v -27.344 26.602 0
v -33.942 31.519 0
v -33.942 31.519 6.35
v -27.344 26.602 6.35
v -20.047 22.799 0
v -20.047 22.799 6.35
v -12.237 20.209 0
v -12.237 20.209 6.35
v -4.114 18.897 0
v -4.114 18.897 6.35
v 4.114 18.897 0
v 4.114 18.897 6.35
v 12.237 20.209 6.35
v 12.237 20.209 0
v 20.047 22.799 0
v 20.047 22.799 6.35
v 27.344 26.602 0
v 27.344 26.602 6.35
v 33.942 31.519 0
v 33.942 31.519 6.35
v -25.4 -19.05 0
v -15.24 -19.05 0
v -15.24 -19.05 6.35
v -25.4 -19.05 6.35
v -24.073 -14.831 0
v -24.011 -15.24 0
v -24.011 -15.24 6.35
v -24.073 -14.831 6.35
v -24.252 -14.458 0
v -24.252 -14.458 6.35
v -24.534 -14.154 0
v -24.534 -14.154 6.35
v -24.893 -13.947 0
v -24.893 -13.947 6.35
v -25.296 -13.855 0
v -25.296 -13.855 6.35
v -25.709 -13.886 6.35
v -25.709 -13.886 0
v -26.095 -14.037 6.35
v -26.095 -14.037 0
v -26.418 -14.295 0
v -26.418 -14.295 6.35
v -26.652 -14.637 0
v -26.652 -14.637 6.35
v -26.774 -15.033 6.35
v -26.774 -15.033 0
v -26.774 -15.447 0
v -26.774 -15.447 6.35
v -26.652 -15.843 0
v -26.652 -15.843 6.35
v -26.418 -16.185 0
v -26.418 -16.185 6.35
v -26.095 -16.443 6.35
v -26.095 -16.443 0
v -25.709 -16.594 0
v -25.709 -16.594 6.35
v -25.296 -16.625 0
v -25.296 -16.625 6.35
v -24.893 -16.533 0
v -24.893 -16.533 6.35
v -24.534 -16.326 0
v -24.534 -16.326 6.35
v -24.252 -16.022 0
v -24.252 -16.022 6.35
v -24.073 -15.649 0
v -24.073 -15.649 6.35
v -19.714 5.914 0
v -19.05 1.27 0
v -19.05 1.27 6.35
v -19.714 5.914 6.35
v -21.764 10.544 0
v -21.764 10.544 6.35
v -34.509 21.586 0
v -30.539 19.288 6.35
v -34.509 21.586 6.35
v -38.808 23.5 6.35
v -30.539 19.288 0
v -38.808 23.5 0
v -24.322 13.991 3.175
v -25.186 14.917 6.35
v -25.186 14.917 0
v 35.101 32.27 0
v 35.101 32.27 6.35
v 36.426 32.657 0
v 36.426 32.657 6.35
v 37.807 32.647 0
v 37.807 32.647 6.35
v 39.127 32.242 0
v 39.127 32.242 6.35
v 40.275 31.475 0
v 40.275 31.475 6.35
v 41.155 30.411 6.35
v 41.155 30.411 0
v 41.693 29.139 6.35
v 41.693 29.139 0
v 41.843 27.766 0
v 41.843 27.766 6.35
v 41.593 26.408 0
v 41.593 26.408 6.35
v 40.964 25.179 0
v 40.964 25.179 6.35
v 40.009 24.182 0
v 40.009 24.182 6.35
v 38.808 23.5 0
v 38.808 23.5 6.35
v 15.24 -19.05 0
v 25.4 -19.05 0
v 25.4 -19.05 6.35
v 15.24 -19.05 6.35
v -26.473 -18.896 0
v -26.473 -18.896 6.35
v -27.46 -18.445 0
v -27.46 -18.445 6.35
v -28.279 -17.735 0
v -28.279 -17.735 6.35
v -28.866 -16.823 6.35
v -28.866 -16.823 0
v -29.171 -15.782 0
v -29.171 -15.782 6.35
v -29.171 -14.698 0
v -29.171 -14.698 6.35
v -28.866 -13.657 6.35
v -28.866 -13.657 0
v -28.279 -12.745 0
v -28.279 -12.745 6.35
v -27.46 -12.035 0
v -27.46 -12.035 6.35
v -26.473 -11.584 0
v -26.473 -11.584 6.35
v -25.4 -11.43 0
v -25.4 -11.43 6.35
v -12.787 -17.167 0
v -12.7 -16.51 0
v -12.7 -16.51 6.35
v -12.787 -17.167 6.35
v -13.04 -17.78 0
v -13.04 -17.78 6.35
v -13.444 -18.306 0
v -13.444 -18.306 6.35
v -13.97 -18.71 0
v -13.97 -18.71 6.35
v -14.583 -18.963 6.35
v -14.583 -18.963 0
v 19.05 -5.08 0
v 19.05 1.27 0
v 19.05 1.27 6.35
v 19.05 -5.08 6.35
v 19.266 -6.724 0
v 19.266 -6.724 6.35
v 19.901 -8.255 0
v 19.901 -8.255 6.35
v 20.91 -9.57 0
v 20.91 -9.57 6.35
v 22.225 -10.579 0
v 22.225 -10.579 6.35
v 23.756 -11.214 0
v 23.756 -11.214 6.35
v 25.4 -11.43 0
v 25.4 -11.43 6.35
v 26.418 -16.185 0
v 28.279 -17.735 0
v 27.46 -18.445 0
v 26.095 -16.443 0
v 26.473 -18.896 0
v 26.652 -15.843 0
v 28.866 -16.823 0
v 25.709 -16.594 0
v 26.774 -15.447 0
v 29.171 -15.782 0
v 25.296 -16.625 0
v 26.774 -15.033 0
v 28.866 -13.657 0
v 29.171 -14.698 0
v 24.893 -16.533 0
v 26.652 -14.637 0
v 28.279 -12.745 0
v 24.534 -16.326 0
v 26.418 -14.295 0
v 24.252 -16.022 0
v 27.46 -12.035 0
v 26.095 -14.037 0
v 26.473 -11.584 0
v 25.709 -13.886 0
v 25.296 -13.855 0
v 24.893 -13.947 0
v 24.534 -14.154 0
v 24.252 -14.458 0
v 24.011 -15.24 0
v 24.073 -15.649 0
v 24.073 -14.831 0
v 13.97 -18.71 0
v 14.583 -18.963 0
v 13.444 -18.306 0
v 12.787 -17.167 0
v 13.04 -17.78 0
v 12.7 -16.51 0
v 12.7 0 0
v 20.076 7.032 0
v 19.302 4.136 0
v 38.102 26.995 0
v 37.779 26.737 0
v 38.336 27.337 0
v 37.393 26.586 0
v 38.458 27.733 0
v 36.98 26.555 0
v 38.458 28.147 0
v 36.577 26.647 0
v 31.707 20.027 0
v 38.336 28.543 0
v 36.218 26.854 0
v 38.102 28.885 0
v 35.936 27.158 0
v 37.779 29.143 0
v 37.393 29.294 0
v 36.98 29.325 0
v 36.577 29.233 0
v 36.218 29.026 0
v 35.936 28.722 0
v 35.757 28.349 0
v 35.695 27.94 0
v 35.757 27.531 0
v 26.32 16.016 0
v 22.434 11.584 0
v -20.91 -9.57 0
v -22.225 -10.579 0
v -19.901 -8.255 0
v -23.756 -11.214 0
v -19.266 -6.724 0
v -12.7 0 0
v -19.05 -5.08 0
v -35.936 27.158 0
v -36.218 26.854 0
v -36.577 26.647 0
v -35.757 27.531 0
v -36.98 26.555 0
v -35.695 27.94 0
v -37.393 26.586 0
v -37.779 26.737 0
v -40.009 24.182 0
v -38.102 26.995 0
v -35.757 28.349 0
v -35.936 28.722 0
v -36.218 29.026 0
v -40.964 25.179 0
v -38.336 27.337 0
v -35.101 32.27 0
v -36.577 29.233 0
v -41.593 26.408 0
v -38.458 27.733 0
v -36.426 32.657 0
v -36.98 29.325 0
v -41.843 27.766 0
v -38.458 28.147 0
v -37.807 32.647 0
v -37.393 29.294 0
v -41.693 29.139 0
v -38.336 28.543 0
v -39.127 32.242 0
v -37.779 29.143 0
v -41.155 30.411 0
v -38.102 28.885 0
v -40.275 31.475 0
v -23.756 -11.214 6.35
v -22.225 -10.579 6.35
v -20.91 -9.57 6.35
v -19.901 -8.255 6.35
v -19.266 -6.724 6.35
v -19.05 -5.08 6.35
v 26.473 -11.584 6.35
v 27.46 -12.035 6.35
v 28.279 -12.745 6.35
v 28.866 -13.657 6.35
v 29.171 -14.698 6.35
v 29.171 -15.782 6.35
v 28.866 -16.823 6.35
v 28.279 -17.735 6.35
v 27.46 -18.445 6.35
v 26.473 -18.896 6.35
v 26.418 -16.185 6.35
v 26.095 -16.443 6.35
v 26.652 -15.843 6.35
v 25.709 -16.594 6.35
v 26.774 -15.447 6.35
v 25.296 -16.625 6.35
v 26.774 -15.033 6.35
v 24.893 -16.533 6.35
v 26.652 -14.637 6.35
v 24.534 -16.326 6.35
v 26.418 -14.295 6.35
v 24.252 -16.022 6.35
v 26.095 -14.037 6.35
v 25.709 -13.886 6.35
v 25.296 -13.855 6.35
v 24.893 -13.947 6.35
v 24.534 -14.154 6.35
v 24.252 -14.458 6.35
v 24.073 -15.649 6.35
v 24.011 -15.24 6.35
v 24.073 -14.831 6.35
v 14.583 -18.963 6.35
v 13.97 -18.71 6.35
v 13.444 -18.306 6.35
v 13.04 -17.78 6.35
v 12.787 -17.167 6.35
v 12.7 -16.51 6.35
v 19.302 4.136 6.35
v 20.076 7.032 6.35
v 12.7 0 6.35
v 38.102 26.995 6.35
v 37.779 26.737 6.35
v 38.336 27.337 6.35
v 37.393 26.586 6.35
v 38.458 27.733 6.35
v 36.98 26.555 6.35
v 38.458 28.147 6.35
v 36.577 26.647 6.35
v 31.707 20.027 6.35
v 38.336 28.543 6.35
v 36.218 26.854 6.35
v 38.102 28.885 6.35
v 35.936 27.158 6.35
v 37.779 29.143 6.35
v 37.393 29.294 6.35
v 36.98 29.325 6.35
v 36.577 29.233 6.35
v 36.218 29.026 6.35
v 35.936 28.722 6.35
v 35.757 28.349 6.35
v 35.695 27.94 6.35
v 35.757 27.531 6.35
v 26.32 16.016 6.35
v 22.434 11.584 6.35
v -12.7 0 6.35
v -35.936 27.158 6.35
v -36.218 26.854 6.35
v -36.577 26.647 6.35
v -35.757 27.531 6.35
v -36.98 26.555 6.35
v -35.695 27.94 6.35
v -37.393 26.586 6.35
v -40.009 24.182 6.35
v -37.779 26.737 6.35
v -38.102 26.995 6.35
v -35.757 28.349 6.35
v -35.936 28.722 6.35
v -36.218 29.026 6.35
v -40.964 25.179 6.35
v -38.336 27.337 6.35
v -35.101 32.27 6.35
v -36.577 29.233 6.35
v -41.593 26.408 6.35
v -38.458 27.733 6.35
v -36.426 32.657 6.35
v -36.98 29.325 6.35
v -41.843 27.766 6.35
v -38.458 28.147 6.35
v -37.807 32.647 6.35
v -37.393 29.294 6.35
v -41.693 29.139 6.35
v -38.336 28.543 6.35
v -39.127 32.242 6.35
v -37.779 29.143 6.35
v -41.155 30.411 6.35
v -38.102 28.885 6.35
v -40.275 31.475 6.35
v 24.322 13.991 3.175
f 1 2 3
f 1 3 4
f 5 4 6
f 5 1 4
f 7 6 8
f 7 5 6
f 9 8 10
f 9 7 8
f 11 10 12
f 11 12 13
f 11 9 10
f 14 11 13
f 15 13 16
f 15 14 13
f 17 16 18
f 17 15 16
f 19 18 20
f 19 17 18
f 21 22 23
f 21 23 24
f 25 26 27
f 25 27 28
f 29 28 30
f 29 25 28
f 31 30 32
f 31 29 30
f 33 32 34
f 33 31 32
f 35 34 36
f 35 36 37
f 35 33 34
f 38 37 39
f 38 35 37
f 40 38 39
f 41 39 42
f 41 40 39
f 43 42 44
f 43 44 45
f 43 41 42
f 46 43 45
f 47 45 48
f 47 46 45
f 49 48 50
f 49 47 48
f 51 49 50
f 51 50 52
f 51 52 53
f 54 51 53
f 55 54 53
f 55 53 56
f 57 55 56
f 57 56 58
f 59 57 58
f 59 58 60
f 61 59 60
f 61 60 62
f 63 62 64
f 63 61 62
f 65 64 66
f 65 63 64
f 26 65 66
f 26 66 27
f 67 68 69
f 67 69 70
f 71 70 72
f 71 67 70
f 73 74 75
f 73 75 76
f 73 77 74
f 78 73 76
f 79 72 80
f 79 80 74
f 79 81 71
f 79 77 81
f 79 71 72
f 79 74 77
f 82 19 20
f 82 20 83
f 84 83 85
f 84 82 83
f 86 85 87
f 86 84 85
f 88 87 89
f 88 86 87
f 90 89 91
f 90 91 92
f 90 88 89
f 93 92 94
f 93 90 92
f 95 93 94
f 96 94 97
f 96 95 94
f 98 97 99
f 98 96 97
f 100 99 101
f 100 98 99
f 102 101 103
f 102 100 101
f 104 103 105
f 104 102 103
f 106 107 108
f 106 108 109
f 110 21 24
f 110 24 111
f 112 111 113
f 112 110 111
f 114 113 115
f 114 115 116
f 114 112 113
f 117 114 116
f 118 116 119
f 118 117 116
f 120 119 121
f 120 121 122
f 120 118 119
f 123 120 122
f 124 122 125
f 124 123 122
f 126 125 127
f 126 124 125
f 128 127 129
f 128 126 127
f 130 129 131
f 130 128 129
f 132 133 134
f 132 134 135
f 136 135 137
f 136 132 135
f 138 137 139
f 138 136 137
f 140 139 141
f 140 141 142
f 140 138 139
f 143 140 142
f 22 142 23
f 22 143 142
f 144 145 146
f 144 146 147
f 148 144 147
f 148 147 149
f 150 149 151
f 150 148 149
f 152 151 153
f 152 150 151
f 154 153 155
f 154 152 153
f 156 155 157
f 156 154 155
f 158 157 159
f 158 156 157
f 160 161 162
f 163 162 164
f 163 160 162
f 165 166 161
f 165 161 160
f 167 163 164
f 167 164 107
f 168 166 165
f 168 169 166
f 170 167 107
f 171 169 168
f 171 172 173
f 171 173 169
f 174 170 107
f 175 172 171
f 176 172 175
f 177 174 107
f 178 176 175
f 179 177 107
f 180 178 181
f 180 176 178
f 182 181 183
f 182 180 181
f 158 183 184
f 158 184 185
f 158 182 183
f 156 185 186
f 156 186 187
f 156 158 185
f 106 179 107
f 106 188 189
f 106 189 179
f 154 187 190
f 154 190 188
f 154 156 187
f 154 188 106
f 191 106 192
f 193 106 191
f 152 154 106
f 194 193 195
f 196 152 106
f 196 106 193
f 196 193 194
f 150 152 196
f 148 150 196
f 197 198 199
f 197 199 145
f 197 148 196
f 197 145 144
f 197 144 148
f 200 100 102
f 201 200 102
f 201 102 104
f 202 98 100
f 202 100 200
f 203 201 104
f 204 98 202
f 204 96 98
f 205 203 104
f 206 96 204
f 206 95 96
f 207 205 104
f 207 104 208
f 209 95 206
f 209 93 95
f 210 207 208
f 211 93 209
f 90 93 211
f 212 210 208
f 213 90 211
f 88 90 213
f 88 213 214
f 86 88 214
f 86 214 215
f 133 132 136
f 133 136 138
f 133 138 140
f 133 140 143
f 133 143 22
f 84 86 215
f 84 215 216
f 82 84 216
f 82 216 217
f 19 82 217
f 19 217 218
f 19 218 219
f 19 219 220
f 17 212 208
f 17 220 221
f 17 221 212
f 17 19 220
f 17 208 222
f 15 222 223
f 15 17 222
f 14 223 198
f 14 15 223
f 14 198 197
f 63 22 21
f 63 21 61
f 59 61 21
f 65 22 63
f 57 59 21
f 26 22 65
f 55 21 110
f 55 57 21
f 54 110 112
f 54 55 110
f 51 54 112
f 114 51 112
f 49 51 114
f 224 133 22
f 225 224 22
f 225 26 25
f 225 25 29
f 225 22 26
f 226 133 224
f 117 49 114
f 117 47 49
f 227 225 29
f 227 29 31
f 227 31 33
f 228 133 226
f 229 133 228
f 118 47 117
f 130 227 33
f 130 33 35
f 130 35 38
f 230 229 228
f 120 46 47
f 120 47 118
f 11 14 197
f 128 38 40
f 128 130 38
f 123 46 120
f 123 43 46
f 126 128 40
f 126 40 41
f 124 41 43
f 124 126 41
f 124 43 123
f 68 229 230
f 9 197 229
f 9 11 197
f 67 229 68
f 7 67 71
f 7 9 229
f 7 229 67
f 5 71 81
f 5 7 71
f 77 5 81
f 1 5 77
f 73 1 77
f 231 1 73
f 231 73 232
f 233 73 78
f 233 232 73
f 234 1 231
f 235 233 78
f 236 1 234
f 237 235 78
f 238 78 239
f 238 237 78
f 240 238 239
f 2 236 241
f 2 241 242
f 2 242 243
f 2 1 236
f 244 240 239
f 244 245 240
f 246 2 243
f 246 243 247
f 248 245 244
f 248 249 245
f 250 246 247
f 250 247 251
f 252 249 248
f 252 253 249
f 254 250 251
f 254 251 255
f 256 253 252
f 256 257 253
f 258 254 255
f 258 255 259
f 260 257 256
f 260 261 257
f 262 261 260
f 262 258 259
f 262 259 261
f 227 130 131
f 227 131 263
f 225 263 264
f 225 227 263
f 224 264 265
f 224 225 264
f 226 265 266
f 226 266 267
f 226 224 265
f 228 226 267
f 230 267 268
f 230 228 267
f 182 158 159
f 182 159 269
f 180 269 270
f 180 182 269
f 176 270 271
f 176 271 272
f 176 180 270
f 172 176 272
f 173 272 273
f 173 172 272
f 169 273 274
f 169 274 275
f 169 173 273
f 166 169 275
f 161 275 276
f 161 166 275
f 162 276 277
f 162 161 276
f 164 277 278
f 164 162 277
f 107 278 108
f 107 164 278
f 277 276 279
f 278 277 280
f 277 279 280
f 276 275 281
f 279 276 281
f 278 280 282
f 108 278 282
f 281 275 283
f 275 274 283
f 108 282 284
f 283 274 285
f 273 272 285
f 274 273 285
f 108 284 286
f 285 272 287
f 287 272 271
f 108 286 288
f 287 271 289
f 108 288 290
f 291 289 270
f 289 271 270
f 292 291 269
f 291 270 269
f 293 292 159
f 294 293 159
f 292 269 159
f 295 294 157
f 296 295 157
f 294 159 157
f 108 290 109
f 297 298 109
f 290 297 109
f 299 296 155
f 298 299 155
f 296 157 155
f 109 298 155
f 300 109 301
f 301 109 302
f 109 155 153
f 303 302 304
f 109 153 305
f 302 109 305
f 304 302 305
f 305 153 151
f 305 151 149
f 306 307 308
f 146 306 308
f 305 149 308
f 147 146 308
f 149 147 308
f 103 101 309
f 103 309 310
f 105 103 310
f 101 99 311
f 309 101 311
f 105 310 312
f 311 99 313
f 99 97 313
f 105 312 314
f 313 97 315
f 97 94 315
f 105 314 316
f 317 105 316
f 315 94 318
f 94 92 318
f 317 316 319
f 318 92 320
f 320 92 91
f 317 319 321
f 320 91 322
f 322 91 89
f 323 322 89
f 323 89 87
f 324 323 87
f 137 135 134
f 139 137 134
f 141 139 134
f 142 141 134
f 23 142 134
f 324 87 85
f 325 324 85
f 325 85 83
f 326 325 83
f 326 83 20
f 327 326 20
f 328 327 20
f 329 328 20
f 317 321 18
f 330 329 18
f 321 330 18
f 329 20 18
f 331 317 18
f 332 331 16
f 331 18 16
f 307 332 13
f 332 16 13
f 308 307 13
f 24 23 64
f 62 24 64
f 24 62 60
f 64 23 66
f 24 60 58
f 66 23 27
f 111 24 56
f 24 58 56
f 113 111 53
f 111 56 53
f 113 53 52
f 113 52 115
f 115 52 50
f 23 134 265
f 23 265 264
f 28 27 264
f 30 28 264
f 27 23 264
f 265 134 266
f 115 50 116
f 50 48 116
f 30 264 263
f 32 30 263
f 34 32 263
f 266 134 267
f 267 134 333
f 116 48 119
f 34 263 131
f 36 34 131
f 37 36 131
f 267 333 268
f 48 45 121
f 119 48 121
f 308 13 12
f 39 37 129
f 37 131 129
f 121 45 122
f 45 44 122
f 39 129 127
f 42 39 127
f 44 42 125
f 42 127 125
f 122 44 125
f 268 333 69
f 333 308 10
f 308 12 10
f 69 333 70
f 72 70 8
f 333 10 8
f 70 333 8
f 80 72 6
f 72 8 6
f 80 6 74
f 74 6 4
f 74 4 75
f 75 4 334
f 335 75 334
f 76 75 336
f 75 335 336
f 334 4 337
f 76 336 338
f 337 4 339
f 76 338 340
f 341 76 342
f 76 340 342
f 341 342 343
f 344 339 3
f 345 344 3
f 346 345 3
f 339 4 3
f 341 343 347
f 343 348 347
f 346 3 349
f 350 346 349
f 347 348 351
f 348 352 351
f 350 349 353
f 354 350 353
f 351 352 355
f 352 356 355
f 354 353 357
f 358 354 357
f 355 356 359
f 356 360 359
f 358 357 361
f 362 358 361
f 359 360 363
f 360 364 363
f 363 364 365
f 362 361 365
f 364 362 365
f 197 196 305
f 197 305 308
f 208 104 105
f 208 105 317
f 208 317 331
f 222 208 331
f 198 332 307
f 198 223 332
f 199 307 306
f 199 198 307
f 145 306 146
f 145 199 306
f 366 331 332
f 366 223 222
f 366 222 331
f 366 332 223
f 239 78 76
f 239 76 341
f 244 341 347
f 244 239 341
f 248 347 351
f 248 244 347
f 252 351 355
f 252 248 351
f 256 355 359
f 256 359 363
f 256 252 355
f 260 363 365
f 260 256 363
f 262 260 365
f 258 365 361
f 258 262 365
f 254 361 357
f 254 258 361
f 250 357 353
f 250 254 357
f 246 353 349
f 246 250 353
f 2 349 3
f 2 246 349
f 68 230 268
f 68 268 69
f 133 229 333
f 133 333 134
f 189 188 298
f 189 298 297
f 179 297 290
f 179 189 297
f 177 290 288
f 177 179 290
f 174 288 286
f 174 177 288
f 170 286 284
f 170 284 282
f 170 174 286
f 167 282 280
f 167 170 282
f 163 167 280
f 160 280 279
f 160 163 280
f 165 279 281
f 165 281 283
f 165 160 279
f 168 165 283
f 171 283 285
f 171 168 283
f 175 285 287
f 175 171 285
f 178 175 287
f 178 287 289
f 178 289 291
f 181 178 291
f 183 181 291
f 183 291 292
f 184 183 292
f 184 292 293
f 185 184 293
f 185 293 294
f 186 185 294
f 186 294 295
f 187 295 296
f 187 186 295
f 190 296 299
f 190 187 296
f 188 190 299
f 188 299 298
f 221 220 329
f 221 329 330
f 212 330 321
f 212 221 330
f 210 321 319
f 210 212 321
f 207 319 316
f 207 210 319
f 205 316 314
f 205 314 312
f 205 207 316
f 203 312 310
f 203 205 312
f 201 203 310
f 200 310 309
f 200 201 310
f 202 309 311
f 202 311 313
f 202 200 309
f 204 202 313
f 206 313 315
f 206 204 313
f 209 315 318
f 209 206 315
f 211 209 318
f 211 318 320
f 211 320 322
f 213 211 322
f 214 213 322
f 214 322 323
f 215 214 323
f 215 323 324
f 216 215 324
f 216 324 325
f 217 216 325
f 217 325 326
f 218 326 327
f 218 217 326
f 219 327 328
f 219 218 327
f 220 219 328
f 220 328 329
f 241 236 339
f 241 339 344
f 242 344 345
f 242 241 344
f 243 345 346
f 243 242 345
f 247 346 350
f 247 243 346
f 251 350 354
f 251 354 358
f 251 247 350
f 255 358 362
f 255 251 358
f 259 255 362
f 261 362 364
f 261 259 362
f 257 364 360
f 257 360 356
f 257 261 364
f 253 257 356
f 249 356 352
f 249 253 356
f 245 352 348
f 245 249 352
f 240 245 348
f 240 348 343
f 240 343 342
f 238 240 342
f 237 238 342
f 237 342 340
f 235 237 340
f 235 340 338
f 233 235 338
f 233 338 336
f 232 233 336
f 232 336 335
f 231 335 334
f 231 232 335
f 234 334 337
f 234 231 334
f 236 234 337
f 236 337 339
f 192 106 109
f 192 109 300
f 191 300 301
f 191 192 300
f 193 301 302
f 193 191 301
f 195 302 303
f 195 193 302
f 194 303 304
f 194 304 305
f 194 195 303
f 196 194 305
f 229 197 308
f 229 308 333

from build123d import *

# Parameters (mm, degrees)
SKETCH1_R           = 1.3890625
BOSS_EXTRUDE1_DEPTH = 6.35


with BuildPart() as part:
    # Sketch1 → Boss-Extrude1 (new body)
    with BuildSketch(Plane.XY):
        with BuildLine():
            Line((12.7, 0), (-12.7, 0))
            Line((-12.7, 0), (-12.7, -16.51))
            ThreePointArc((-12.7, -16.51), (-13.443948776, -18.306051224), (-15.24, -19.05))
            Line((-15.24, -19.05), (-25.4, -19.05))
            ThreePointArc((-25.4, -19.05), (-29.21, -15.24), (-25.4, -11.43))
            ThreePointArc((-25.4, -11.43), (-20.909871939, -9.570128061), (-19.05, -5.08))
            Line((-19.05, -5.08), (-19.05, 1.27))
            add(Edge.make_bspline(
                [(-19.05, 1.27), (-19.05, 15.828620542), (-38.807847876, 23.500433408)],
                knots=[0, 0, 0, 1.015776501, 1.015776501, 1.015776501], degree=2, weights=[1, 0.873773469, 1]))
            ThreePointArc((-38.807847876, 23.500433408), (-41.155413928, 30.410828457), (-33.941740139, 31.518771801))
            ThreePointArc((-33.941740139, 31.518771801), (0, 18.732499831), (33.941740139, 31.518771801))
            ThreePointArc((33.941740139, 31.518771801), (41.155413928, 30.410828457), (38.807847876, 23.500433408))
            add(Edge.make_bspline(
                [(38.807847876, 23.500433408), (19.05, 15.828620542), (19.05, 1.27)],
                knots=[2.125816153, 2.125816153, 2.125816153, 3.141592654, 3.141592654, 3.141592654], degree=2, weights=[1, 0.873773469, 1]))
            Line((19.05, 1.27), (19.05, -5.08))
            ThreePointArc((19.05, -5.08), (20.909871939, -9.570128061), (25.4, -11.43))
            ThreePointArc((25.4, -11.43), (29.21, -15.24), (25.4, -19.05))
            Line((25.4, -19.05), (15.24, -19.05))
            ThreePointArc((15.24, -19.05), (13.443948776, -18.306051224), (12.7, -16.51))
            Line((12.7, -16.51), (12.7, 0))
        make_face()
        with Locations((-37.084, 27.94)):
            Circle(SKETCH1_R, mode=Mode.SUBTRACT)
        with Locations((-25.4, -15.24)):
            Circle(SKETCH1_R, mode=Mode.SUBTRACT)
        with Locations(Location((25.4, -15.24, 0), (0, 0, 180))):
            Circle(SKETCH1_R, mode=Mode.SUBTRACT)
        with Locations(Location((37.084, 27.94, 0), (0, 0, 180))):
            Circle(SKETCH1_R, mode=Mode.SUBTRACT)
    extrude(amount=BOSS_EXTRUDE1_DEPTH)


solid = part.part
